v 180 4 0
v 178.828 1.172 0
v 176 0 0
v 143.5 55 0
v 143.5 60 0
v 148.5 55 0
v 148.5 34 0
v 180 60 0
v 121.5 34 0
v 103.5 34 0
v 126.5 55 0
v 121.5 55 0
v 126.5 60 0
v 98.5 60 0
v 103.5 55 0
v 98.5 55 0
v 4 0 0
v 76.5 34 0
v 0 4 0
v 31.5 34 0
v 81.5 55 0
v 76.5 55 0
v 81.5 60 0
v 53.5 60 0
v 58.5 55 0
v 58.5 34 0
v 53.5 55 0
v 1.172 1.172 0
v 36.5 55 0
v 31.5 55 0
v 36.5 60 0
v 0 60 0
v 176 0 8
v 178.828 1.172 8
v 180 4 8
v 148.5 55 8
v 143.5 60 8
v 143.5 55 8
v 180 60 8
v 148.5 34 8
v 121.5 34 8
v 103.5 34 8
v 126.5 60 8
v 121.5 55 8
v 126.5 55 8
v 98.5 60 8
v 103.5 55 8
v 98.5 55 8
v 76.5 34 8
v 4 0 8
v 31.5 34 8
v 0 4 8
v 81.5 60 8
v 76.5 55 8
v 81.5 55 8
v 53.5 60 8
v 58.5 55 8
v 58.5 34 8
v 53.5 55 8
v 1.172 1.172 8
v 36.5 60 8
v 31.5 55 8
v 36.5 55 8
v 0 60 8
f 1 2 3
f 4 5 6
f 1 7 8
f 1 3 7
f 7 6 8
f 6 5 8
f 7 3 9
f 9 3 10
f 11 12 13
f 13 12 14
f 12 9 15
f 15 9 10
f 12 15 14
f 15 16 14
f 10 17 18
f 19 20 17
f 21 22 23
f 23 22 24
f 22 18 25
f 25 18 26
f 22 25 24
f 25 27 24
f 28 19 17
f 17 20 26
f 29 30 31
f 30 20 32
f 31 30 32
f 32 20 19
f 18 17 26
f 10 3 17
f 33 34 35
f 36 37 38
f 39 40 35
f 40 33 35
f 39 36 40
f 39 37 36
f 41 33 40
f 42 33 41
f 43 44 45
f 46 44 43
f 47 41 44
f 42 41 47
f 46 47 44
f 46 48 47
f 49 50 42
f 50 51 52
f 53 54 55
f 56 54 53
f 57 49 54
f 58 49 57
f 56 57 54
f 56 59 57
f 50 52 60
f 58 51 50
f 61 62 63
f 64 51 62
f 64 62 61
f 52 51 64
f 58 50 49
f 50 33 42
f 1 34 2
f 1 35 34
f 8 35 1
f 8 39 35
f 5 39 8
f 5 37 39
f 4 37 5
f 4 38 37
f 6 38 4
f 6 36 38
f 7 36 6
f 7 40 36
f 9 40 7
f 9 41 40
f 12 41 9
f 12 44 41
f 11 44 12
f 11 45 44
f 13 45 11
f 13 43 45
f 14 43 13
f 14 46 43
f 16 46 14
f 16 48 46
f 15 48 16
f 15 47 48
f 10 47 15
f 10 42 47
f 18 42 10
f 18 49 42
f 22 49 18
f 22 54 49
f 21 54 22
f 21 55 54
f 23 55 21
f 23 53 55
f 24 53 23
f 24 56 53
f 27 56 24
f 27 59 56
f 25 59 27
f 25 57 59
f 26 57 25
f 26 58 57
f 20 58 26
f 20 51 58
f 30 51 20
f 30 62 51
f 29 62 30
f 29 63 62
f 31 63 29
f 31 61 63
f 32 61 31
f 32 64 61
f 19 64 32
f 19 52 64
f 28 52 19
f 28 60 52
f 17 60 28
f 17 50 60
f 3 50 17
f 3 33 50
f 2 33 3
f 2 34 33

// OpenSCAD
$fn = 32;

// ----------------------------------------------------------------------
// Oversize slot bar: 180 mm bar with 3 oversize windows
// ----------------------------------------------------------------------

// --- parameters (mm) ---
profile_height = 8;       // extrusion height
profile_points = 32;      // points of the closed outline

profile = [[0, 4], [1.172, 1.172], [4, 0], [176, 0], [178.828, 1.172], [180, 4], [180, 60], [143.5, 60], [143.5, 55], [148.5, 55], [148.5, 34], [121.5, 34], [121.5, 55], [126.5, 55], [126.5, 60], [98.5, 60], [98.5, 55], [103.5, 55], [103.5, 34], [76.5, 34], [76.5, 55], [81.5, 55], [81.5, 60], [53.5, 60], [53.5, 55], [58.5, 55], [58.5, 34], [31.5, 34], [31.5, 55], [36.5, 55], [36.5, 60], [0, 60]];  // single closed polygon, 32 points, counter clockwise

// --- the one profile operation ---
linear_extrude(height = profile_height) polygon(points = profile);
